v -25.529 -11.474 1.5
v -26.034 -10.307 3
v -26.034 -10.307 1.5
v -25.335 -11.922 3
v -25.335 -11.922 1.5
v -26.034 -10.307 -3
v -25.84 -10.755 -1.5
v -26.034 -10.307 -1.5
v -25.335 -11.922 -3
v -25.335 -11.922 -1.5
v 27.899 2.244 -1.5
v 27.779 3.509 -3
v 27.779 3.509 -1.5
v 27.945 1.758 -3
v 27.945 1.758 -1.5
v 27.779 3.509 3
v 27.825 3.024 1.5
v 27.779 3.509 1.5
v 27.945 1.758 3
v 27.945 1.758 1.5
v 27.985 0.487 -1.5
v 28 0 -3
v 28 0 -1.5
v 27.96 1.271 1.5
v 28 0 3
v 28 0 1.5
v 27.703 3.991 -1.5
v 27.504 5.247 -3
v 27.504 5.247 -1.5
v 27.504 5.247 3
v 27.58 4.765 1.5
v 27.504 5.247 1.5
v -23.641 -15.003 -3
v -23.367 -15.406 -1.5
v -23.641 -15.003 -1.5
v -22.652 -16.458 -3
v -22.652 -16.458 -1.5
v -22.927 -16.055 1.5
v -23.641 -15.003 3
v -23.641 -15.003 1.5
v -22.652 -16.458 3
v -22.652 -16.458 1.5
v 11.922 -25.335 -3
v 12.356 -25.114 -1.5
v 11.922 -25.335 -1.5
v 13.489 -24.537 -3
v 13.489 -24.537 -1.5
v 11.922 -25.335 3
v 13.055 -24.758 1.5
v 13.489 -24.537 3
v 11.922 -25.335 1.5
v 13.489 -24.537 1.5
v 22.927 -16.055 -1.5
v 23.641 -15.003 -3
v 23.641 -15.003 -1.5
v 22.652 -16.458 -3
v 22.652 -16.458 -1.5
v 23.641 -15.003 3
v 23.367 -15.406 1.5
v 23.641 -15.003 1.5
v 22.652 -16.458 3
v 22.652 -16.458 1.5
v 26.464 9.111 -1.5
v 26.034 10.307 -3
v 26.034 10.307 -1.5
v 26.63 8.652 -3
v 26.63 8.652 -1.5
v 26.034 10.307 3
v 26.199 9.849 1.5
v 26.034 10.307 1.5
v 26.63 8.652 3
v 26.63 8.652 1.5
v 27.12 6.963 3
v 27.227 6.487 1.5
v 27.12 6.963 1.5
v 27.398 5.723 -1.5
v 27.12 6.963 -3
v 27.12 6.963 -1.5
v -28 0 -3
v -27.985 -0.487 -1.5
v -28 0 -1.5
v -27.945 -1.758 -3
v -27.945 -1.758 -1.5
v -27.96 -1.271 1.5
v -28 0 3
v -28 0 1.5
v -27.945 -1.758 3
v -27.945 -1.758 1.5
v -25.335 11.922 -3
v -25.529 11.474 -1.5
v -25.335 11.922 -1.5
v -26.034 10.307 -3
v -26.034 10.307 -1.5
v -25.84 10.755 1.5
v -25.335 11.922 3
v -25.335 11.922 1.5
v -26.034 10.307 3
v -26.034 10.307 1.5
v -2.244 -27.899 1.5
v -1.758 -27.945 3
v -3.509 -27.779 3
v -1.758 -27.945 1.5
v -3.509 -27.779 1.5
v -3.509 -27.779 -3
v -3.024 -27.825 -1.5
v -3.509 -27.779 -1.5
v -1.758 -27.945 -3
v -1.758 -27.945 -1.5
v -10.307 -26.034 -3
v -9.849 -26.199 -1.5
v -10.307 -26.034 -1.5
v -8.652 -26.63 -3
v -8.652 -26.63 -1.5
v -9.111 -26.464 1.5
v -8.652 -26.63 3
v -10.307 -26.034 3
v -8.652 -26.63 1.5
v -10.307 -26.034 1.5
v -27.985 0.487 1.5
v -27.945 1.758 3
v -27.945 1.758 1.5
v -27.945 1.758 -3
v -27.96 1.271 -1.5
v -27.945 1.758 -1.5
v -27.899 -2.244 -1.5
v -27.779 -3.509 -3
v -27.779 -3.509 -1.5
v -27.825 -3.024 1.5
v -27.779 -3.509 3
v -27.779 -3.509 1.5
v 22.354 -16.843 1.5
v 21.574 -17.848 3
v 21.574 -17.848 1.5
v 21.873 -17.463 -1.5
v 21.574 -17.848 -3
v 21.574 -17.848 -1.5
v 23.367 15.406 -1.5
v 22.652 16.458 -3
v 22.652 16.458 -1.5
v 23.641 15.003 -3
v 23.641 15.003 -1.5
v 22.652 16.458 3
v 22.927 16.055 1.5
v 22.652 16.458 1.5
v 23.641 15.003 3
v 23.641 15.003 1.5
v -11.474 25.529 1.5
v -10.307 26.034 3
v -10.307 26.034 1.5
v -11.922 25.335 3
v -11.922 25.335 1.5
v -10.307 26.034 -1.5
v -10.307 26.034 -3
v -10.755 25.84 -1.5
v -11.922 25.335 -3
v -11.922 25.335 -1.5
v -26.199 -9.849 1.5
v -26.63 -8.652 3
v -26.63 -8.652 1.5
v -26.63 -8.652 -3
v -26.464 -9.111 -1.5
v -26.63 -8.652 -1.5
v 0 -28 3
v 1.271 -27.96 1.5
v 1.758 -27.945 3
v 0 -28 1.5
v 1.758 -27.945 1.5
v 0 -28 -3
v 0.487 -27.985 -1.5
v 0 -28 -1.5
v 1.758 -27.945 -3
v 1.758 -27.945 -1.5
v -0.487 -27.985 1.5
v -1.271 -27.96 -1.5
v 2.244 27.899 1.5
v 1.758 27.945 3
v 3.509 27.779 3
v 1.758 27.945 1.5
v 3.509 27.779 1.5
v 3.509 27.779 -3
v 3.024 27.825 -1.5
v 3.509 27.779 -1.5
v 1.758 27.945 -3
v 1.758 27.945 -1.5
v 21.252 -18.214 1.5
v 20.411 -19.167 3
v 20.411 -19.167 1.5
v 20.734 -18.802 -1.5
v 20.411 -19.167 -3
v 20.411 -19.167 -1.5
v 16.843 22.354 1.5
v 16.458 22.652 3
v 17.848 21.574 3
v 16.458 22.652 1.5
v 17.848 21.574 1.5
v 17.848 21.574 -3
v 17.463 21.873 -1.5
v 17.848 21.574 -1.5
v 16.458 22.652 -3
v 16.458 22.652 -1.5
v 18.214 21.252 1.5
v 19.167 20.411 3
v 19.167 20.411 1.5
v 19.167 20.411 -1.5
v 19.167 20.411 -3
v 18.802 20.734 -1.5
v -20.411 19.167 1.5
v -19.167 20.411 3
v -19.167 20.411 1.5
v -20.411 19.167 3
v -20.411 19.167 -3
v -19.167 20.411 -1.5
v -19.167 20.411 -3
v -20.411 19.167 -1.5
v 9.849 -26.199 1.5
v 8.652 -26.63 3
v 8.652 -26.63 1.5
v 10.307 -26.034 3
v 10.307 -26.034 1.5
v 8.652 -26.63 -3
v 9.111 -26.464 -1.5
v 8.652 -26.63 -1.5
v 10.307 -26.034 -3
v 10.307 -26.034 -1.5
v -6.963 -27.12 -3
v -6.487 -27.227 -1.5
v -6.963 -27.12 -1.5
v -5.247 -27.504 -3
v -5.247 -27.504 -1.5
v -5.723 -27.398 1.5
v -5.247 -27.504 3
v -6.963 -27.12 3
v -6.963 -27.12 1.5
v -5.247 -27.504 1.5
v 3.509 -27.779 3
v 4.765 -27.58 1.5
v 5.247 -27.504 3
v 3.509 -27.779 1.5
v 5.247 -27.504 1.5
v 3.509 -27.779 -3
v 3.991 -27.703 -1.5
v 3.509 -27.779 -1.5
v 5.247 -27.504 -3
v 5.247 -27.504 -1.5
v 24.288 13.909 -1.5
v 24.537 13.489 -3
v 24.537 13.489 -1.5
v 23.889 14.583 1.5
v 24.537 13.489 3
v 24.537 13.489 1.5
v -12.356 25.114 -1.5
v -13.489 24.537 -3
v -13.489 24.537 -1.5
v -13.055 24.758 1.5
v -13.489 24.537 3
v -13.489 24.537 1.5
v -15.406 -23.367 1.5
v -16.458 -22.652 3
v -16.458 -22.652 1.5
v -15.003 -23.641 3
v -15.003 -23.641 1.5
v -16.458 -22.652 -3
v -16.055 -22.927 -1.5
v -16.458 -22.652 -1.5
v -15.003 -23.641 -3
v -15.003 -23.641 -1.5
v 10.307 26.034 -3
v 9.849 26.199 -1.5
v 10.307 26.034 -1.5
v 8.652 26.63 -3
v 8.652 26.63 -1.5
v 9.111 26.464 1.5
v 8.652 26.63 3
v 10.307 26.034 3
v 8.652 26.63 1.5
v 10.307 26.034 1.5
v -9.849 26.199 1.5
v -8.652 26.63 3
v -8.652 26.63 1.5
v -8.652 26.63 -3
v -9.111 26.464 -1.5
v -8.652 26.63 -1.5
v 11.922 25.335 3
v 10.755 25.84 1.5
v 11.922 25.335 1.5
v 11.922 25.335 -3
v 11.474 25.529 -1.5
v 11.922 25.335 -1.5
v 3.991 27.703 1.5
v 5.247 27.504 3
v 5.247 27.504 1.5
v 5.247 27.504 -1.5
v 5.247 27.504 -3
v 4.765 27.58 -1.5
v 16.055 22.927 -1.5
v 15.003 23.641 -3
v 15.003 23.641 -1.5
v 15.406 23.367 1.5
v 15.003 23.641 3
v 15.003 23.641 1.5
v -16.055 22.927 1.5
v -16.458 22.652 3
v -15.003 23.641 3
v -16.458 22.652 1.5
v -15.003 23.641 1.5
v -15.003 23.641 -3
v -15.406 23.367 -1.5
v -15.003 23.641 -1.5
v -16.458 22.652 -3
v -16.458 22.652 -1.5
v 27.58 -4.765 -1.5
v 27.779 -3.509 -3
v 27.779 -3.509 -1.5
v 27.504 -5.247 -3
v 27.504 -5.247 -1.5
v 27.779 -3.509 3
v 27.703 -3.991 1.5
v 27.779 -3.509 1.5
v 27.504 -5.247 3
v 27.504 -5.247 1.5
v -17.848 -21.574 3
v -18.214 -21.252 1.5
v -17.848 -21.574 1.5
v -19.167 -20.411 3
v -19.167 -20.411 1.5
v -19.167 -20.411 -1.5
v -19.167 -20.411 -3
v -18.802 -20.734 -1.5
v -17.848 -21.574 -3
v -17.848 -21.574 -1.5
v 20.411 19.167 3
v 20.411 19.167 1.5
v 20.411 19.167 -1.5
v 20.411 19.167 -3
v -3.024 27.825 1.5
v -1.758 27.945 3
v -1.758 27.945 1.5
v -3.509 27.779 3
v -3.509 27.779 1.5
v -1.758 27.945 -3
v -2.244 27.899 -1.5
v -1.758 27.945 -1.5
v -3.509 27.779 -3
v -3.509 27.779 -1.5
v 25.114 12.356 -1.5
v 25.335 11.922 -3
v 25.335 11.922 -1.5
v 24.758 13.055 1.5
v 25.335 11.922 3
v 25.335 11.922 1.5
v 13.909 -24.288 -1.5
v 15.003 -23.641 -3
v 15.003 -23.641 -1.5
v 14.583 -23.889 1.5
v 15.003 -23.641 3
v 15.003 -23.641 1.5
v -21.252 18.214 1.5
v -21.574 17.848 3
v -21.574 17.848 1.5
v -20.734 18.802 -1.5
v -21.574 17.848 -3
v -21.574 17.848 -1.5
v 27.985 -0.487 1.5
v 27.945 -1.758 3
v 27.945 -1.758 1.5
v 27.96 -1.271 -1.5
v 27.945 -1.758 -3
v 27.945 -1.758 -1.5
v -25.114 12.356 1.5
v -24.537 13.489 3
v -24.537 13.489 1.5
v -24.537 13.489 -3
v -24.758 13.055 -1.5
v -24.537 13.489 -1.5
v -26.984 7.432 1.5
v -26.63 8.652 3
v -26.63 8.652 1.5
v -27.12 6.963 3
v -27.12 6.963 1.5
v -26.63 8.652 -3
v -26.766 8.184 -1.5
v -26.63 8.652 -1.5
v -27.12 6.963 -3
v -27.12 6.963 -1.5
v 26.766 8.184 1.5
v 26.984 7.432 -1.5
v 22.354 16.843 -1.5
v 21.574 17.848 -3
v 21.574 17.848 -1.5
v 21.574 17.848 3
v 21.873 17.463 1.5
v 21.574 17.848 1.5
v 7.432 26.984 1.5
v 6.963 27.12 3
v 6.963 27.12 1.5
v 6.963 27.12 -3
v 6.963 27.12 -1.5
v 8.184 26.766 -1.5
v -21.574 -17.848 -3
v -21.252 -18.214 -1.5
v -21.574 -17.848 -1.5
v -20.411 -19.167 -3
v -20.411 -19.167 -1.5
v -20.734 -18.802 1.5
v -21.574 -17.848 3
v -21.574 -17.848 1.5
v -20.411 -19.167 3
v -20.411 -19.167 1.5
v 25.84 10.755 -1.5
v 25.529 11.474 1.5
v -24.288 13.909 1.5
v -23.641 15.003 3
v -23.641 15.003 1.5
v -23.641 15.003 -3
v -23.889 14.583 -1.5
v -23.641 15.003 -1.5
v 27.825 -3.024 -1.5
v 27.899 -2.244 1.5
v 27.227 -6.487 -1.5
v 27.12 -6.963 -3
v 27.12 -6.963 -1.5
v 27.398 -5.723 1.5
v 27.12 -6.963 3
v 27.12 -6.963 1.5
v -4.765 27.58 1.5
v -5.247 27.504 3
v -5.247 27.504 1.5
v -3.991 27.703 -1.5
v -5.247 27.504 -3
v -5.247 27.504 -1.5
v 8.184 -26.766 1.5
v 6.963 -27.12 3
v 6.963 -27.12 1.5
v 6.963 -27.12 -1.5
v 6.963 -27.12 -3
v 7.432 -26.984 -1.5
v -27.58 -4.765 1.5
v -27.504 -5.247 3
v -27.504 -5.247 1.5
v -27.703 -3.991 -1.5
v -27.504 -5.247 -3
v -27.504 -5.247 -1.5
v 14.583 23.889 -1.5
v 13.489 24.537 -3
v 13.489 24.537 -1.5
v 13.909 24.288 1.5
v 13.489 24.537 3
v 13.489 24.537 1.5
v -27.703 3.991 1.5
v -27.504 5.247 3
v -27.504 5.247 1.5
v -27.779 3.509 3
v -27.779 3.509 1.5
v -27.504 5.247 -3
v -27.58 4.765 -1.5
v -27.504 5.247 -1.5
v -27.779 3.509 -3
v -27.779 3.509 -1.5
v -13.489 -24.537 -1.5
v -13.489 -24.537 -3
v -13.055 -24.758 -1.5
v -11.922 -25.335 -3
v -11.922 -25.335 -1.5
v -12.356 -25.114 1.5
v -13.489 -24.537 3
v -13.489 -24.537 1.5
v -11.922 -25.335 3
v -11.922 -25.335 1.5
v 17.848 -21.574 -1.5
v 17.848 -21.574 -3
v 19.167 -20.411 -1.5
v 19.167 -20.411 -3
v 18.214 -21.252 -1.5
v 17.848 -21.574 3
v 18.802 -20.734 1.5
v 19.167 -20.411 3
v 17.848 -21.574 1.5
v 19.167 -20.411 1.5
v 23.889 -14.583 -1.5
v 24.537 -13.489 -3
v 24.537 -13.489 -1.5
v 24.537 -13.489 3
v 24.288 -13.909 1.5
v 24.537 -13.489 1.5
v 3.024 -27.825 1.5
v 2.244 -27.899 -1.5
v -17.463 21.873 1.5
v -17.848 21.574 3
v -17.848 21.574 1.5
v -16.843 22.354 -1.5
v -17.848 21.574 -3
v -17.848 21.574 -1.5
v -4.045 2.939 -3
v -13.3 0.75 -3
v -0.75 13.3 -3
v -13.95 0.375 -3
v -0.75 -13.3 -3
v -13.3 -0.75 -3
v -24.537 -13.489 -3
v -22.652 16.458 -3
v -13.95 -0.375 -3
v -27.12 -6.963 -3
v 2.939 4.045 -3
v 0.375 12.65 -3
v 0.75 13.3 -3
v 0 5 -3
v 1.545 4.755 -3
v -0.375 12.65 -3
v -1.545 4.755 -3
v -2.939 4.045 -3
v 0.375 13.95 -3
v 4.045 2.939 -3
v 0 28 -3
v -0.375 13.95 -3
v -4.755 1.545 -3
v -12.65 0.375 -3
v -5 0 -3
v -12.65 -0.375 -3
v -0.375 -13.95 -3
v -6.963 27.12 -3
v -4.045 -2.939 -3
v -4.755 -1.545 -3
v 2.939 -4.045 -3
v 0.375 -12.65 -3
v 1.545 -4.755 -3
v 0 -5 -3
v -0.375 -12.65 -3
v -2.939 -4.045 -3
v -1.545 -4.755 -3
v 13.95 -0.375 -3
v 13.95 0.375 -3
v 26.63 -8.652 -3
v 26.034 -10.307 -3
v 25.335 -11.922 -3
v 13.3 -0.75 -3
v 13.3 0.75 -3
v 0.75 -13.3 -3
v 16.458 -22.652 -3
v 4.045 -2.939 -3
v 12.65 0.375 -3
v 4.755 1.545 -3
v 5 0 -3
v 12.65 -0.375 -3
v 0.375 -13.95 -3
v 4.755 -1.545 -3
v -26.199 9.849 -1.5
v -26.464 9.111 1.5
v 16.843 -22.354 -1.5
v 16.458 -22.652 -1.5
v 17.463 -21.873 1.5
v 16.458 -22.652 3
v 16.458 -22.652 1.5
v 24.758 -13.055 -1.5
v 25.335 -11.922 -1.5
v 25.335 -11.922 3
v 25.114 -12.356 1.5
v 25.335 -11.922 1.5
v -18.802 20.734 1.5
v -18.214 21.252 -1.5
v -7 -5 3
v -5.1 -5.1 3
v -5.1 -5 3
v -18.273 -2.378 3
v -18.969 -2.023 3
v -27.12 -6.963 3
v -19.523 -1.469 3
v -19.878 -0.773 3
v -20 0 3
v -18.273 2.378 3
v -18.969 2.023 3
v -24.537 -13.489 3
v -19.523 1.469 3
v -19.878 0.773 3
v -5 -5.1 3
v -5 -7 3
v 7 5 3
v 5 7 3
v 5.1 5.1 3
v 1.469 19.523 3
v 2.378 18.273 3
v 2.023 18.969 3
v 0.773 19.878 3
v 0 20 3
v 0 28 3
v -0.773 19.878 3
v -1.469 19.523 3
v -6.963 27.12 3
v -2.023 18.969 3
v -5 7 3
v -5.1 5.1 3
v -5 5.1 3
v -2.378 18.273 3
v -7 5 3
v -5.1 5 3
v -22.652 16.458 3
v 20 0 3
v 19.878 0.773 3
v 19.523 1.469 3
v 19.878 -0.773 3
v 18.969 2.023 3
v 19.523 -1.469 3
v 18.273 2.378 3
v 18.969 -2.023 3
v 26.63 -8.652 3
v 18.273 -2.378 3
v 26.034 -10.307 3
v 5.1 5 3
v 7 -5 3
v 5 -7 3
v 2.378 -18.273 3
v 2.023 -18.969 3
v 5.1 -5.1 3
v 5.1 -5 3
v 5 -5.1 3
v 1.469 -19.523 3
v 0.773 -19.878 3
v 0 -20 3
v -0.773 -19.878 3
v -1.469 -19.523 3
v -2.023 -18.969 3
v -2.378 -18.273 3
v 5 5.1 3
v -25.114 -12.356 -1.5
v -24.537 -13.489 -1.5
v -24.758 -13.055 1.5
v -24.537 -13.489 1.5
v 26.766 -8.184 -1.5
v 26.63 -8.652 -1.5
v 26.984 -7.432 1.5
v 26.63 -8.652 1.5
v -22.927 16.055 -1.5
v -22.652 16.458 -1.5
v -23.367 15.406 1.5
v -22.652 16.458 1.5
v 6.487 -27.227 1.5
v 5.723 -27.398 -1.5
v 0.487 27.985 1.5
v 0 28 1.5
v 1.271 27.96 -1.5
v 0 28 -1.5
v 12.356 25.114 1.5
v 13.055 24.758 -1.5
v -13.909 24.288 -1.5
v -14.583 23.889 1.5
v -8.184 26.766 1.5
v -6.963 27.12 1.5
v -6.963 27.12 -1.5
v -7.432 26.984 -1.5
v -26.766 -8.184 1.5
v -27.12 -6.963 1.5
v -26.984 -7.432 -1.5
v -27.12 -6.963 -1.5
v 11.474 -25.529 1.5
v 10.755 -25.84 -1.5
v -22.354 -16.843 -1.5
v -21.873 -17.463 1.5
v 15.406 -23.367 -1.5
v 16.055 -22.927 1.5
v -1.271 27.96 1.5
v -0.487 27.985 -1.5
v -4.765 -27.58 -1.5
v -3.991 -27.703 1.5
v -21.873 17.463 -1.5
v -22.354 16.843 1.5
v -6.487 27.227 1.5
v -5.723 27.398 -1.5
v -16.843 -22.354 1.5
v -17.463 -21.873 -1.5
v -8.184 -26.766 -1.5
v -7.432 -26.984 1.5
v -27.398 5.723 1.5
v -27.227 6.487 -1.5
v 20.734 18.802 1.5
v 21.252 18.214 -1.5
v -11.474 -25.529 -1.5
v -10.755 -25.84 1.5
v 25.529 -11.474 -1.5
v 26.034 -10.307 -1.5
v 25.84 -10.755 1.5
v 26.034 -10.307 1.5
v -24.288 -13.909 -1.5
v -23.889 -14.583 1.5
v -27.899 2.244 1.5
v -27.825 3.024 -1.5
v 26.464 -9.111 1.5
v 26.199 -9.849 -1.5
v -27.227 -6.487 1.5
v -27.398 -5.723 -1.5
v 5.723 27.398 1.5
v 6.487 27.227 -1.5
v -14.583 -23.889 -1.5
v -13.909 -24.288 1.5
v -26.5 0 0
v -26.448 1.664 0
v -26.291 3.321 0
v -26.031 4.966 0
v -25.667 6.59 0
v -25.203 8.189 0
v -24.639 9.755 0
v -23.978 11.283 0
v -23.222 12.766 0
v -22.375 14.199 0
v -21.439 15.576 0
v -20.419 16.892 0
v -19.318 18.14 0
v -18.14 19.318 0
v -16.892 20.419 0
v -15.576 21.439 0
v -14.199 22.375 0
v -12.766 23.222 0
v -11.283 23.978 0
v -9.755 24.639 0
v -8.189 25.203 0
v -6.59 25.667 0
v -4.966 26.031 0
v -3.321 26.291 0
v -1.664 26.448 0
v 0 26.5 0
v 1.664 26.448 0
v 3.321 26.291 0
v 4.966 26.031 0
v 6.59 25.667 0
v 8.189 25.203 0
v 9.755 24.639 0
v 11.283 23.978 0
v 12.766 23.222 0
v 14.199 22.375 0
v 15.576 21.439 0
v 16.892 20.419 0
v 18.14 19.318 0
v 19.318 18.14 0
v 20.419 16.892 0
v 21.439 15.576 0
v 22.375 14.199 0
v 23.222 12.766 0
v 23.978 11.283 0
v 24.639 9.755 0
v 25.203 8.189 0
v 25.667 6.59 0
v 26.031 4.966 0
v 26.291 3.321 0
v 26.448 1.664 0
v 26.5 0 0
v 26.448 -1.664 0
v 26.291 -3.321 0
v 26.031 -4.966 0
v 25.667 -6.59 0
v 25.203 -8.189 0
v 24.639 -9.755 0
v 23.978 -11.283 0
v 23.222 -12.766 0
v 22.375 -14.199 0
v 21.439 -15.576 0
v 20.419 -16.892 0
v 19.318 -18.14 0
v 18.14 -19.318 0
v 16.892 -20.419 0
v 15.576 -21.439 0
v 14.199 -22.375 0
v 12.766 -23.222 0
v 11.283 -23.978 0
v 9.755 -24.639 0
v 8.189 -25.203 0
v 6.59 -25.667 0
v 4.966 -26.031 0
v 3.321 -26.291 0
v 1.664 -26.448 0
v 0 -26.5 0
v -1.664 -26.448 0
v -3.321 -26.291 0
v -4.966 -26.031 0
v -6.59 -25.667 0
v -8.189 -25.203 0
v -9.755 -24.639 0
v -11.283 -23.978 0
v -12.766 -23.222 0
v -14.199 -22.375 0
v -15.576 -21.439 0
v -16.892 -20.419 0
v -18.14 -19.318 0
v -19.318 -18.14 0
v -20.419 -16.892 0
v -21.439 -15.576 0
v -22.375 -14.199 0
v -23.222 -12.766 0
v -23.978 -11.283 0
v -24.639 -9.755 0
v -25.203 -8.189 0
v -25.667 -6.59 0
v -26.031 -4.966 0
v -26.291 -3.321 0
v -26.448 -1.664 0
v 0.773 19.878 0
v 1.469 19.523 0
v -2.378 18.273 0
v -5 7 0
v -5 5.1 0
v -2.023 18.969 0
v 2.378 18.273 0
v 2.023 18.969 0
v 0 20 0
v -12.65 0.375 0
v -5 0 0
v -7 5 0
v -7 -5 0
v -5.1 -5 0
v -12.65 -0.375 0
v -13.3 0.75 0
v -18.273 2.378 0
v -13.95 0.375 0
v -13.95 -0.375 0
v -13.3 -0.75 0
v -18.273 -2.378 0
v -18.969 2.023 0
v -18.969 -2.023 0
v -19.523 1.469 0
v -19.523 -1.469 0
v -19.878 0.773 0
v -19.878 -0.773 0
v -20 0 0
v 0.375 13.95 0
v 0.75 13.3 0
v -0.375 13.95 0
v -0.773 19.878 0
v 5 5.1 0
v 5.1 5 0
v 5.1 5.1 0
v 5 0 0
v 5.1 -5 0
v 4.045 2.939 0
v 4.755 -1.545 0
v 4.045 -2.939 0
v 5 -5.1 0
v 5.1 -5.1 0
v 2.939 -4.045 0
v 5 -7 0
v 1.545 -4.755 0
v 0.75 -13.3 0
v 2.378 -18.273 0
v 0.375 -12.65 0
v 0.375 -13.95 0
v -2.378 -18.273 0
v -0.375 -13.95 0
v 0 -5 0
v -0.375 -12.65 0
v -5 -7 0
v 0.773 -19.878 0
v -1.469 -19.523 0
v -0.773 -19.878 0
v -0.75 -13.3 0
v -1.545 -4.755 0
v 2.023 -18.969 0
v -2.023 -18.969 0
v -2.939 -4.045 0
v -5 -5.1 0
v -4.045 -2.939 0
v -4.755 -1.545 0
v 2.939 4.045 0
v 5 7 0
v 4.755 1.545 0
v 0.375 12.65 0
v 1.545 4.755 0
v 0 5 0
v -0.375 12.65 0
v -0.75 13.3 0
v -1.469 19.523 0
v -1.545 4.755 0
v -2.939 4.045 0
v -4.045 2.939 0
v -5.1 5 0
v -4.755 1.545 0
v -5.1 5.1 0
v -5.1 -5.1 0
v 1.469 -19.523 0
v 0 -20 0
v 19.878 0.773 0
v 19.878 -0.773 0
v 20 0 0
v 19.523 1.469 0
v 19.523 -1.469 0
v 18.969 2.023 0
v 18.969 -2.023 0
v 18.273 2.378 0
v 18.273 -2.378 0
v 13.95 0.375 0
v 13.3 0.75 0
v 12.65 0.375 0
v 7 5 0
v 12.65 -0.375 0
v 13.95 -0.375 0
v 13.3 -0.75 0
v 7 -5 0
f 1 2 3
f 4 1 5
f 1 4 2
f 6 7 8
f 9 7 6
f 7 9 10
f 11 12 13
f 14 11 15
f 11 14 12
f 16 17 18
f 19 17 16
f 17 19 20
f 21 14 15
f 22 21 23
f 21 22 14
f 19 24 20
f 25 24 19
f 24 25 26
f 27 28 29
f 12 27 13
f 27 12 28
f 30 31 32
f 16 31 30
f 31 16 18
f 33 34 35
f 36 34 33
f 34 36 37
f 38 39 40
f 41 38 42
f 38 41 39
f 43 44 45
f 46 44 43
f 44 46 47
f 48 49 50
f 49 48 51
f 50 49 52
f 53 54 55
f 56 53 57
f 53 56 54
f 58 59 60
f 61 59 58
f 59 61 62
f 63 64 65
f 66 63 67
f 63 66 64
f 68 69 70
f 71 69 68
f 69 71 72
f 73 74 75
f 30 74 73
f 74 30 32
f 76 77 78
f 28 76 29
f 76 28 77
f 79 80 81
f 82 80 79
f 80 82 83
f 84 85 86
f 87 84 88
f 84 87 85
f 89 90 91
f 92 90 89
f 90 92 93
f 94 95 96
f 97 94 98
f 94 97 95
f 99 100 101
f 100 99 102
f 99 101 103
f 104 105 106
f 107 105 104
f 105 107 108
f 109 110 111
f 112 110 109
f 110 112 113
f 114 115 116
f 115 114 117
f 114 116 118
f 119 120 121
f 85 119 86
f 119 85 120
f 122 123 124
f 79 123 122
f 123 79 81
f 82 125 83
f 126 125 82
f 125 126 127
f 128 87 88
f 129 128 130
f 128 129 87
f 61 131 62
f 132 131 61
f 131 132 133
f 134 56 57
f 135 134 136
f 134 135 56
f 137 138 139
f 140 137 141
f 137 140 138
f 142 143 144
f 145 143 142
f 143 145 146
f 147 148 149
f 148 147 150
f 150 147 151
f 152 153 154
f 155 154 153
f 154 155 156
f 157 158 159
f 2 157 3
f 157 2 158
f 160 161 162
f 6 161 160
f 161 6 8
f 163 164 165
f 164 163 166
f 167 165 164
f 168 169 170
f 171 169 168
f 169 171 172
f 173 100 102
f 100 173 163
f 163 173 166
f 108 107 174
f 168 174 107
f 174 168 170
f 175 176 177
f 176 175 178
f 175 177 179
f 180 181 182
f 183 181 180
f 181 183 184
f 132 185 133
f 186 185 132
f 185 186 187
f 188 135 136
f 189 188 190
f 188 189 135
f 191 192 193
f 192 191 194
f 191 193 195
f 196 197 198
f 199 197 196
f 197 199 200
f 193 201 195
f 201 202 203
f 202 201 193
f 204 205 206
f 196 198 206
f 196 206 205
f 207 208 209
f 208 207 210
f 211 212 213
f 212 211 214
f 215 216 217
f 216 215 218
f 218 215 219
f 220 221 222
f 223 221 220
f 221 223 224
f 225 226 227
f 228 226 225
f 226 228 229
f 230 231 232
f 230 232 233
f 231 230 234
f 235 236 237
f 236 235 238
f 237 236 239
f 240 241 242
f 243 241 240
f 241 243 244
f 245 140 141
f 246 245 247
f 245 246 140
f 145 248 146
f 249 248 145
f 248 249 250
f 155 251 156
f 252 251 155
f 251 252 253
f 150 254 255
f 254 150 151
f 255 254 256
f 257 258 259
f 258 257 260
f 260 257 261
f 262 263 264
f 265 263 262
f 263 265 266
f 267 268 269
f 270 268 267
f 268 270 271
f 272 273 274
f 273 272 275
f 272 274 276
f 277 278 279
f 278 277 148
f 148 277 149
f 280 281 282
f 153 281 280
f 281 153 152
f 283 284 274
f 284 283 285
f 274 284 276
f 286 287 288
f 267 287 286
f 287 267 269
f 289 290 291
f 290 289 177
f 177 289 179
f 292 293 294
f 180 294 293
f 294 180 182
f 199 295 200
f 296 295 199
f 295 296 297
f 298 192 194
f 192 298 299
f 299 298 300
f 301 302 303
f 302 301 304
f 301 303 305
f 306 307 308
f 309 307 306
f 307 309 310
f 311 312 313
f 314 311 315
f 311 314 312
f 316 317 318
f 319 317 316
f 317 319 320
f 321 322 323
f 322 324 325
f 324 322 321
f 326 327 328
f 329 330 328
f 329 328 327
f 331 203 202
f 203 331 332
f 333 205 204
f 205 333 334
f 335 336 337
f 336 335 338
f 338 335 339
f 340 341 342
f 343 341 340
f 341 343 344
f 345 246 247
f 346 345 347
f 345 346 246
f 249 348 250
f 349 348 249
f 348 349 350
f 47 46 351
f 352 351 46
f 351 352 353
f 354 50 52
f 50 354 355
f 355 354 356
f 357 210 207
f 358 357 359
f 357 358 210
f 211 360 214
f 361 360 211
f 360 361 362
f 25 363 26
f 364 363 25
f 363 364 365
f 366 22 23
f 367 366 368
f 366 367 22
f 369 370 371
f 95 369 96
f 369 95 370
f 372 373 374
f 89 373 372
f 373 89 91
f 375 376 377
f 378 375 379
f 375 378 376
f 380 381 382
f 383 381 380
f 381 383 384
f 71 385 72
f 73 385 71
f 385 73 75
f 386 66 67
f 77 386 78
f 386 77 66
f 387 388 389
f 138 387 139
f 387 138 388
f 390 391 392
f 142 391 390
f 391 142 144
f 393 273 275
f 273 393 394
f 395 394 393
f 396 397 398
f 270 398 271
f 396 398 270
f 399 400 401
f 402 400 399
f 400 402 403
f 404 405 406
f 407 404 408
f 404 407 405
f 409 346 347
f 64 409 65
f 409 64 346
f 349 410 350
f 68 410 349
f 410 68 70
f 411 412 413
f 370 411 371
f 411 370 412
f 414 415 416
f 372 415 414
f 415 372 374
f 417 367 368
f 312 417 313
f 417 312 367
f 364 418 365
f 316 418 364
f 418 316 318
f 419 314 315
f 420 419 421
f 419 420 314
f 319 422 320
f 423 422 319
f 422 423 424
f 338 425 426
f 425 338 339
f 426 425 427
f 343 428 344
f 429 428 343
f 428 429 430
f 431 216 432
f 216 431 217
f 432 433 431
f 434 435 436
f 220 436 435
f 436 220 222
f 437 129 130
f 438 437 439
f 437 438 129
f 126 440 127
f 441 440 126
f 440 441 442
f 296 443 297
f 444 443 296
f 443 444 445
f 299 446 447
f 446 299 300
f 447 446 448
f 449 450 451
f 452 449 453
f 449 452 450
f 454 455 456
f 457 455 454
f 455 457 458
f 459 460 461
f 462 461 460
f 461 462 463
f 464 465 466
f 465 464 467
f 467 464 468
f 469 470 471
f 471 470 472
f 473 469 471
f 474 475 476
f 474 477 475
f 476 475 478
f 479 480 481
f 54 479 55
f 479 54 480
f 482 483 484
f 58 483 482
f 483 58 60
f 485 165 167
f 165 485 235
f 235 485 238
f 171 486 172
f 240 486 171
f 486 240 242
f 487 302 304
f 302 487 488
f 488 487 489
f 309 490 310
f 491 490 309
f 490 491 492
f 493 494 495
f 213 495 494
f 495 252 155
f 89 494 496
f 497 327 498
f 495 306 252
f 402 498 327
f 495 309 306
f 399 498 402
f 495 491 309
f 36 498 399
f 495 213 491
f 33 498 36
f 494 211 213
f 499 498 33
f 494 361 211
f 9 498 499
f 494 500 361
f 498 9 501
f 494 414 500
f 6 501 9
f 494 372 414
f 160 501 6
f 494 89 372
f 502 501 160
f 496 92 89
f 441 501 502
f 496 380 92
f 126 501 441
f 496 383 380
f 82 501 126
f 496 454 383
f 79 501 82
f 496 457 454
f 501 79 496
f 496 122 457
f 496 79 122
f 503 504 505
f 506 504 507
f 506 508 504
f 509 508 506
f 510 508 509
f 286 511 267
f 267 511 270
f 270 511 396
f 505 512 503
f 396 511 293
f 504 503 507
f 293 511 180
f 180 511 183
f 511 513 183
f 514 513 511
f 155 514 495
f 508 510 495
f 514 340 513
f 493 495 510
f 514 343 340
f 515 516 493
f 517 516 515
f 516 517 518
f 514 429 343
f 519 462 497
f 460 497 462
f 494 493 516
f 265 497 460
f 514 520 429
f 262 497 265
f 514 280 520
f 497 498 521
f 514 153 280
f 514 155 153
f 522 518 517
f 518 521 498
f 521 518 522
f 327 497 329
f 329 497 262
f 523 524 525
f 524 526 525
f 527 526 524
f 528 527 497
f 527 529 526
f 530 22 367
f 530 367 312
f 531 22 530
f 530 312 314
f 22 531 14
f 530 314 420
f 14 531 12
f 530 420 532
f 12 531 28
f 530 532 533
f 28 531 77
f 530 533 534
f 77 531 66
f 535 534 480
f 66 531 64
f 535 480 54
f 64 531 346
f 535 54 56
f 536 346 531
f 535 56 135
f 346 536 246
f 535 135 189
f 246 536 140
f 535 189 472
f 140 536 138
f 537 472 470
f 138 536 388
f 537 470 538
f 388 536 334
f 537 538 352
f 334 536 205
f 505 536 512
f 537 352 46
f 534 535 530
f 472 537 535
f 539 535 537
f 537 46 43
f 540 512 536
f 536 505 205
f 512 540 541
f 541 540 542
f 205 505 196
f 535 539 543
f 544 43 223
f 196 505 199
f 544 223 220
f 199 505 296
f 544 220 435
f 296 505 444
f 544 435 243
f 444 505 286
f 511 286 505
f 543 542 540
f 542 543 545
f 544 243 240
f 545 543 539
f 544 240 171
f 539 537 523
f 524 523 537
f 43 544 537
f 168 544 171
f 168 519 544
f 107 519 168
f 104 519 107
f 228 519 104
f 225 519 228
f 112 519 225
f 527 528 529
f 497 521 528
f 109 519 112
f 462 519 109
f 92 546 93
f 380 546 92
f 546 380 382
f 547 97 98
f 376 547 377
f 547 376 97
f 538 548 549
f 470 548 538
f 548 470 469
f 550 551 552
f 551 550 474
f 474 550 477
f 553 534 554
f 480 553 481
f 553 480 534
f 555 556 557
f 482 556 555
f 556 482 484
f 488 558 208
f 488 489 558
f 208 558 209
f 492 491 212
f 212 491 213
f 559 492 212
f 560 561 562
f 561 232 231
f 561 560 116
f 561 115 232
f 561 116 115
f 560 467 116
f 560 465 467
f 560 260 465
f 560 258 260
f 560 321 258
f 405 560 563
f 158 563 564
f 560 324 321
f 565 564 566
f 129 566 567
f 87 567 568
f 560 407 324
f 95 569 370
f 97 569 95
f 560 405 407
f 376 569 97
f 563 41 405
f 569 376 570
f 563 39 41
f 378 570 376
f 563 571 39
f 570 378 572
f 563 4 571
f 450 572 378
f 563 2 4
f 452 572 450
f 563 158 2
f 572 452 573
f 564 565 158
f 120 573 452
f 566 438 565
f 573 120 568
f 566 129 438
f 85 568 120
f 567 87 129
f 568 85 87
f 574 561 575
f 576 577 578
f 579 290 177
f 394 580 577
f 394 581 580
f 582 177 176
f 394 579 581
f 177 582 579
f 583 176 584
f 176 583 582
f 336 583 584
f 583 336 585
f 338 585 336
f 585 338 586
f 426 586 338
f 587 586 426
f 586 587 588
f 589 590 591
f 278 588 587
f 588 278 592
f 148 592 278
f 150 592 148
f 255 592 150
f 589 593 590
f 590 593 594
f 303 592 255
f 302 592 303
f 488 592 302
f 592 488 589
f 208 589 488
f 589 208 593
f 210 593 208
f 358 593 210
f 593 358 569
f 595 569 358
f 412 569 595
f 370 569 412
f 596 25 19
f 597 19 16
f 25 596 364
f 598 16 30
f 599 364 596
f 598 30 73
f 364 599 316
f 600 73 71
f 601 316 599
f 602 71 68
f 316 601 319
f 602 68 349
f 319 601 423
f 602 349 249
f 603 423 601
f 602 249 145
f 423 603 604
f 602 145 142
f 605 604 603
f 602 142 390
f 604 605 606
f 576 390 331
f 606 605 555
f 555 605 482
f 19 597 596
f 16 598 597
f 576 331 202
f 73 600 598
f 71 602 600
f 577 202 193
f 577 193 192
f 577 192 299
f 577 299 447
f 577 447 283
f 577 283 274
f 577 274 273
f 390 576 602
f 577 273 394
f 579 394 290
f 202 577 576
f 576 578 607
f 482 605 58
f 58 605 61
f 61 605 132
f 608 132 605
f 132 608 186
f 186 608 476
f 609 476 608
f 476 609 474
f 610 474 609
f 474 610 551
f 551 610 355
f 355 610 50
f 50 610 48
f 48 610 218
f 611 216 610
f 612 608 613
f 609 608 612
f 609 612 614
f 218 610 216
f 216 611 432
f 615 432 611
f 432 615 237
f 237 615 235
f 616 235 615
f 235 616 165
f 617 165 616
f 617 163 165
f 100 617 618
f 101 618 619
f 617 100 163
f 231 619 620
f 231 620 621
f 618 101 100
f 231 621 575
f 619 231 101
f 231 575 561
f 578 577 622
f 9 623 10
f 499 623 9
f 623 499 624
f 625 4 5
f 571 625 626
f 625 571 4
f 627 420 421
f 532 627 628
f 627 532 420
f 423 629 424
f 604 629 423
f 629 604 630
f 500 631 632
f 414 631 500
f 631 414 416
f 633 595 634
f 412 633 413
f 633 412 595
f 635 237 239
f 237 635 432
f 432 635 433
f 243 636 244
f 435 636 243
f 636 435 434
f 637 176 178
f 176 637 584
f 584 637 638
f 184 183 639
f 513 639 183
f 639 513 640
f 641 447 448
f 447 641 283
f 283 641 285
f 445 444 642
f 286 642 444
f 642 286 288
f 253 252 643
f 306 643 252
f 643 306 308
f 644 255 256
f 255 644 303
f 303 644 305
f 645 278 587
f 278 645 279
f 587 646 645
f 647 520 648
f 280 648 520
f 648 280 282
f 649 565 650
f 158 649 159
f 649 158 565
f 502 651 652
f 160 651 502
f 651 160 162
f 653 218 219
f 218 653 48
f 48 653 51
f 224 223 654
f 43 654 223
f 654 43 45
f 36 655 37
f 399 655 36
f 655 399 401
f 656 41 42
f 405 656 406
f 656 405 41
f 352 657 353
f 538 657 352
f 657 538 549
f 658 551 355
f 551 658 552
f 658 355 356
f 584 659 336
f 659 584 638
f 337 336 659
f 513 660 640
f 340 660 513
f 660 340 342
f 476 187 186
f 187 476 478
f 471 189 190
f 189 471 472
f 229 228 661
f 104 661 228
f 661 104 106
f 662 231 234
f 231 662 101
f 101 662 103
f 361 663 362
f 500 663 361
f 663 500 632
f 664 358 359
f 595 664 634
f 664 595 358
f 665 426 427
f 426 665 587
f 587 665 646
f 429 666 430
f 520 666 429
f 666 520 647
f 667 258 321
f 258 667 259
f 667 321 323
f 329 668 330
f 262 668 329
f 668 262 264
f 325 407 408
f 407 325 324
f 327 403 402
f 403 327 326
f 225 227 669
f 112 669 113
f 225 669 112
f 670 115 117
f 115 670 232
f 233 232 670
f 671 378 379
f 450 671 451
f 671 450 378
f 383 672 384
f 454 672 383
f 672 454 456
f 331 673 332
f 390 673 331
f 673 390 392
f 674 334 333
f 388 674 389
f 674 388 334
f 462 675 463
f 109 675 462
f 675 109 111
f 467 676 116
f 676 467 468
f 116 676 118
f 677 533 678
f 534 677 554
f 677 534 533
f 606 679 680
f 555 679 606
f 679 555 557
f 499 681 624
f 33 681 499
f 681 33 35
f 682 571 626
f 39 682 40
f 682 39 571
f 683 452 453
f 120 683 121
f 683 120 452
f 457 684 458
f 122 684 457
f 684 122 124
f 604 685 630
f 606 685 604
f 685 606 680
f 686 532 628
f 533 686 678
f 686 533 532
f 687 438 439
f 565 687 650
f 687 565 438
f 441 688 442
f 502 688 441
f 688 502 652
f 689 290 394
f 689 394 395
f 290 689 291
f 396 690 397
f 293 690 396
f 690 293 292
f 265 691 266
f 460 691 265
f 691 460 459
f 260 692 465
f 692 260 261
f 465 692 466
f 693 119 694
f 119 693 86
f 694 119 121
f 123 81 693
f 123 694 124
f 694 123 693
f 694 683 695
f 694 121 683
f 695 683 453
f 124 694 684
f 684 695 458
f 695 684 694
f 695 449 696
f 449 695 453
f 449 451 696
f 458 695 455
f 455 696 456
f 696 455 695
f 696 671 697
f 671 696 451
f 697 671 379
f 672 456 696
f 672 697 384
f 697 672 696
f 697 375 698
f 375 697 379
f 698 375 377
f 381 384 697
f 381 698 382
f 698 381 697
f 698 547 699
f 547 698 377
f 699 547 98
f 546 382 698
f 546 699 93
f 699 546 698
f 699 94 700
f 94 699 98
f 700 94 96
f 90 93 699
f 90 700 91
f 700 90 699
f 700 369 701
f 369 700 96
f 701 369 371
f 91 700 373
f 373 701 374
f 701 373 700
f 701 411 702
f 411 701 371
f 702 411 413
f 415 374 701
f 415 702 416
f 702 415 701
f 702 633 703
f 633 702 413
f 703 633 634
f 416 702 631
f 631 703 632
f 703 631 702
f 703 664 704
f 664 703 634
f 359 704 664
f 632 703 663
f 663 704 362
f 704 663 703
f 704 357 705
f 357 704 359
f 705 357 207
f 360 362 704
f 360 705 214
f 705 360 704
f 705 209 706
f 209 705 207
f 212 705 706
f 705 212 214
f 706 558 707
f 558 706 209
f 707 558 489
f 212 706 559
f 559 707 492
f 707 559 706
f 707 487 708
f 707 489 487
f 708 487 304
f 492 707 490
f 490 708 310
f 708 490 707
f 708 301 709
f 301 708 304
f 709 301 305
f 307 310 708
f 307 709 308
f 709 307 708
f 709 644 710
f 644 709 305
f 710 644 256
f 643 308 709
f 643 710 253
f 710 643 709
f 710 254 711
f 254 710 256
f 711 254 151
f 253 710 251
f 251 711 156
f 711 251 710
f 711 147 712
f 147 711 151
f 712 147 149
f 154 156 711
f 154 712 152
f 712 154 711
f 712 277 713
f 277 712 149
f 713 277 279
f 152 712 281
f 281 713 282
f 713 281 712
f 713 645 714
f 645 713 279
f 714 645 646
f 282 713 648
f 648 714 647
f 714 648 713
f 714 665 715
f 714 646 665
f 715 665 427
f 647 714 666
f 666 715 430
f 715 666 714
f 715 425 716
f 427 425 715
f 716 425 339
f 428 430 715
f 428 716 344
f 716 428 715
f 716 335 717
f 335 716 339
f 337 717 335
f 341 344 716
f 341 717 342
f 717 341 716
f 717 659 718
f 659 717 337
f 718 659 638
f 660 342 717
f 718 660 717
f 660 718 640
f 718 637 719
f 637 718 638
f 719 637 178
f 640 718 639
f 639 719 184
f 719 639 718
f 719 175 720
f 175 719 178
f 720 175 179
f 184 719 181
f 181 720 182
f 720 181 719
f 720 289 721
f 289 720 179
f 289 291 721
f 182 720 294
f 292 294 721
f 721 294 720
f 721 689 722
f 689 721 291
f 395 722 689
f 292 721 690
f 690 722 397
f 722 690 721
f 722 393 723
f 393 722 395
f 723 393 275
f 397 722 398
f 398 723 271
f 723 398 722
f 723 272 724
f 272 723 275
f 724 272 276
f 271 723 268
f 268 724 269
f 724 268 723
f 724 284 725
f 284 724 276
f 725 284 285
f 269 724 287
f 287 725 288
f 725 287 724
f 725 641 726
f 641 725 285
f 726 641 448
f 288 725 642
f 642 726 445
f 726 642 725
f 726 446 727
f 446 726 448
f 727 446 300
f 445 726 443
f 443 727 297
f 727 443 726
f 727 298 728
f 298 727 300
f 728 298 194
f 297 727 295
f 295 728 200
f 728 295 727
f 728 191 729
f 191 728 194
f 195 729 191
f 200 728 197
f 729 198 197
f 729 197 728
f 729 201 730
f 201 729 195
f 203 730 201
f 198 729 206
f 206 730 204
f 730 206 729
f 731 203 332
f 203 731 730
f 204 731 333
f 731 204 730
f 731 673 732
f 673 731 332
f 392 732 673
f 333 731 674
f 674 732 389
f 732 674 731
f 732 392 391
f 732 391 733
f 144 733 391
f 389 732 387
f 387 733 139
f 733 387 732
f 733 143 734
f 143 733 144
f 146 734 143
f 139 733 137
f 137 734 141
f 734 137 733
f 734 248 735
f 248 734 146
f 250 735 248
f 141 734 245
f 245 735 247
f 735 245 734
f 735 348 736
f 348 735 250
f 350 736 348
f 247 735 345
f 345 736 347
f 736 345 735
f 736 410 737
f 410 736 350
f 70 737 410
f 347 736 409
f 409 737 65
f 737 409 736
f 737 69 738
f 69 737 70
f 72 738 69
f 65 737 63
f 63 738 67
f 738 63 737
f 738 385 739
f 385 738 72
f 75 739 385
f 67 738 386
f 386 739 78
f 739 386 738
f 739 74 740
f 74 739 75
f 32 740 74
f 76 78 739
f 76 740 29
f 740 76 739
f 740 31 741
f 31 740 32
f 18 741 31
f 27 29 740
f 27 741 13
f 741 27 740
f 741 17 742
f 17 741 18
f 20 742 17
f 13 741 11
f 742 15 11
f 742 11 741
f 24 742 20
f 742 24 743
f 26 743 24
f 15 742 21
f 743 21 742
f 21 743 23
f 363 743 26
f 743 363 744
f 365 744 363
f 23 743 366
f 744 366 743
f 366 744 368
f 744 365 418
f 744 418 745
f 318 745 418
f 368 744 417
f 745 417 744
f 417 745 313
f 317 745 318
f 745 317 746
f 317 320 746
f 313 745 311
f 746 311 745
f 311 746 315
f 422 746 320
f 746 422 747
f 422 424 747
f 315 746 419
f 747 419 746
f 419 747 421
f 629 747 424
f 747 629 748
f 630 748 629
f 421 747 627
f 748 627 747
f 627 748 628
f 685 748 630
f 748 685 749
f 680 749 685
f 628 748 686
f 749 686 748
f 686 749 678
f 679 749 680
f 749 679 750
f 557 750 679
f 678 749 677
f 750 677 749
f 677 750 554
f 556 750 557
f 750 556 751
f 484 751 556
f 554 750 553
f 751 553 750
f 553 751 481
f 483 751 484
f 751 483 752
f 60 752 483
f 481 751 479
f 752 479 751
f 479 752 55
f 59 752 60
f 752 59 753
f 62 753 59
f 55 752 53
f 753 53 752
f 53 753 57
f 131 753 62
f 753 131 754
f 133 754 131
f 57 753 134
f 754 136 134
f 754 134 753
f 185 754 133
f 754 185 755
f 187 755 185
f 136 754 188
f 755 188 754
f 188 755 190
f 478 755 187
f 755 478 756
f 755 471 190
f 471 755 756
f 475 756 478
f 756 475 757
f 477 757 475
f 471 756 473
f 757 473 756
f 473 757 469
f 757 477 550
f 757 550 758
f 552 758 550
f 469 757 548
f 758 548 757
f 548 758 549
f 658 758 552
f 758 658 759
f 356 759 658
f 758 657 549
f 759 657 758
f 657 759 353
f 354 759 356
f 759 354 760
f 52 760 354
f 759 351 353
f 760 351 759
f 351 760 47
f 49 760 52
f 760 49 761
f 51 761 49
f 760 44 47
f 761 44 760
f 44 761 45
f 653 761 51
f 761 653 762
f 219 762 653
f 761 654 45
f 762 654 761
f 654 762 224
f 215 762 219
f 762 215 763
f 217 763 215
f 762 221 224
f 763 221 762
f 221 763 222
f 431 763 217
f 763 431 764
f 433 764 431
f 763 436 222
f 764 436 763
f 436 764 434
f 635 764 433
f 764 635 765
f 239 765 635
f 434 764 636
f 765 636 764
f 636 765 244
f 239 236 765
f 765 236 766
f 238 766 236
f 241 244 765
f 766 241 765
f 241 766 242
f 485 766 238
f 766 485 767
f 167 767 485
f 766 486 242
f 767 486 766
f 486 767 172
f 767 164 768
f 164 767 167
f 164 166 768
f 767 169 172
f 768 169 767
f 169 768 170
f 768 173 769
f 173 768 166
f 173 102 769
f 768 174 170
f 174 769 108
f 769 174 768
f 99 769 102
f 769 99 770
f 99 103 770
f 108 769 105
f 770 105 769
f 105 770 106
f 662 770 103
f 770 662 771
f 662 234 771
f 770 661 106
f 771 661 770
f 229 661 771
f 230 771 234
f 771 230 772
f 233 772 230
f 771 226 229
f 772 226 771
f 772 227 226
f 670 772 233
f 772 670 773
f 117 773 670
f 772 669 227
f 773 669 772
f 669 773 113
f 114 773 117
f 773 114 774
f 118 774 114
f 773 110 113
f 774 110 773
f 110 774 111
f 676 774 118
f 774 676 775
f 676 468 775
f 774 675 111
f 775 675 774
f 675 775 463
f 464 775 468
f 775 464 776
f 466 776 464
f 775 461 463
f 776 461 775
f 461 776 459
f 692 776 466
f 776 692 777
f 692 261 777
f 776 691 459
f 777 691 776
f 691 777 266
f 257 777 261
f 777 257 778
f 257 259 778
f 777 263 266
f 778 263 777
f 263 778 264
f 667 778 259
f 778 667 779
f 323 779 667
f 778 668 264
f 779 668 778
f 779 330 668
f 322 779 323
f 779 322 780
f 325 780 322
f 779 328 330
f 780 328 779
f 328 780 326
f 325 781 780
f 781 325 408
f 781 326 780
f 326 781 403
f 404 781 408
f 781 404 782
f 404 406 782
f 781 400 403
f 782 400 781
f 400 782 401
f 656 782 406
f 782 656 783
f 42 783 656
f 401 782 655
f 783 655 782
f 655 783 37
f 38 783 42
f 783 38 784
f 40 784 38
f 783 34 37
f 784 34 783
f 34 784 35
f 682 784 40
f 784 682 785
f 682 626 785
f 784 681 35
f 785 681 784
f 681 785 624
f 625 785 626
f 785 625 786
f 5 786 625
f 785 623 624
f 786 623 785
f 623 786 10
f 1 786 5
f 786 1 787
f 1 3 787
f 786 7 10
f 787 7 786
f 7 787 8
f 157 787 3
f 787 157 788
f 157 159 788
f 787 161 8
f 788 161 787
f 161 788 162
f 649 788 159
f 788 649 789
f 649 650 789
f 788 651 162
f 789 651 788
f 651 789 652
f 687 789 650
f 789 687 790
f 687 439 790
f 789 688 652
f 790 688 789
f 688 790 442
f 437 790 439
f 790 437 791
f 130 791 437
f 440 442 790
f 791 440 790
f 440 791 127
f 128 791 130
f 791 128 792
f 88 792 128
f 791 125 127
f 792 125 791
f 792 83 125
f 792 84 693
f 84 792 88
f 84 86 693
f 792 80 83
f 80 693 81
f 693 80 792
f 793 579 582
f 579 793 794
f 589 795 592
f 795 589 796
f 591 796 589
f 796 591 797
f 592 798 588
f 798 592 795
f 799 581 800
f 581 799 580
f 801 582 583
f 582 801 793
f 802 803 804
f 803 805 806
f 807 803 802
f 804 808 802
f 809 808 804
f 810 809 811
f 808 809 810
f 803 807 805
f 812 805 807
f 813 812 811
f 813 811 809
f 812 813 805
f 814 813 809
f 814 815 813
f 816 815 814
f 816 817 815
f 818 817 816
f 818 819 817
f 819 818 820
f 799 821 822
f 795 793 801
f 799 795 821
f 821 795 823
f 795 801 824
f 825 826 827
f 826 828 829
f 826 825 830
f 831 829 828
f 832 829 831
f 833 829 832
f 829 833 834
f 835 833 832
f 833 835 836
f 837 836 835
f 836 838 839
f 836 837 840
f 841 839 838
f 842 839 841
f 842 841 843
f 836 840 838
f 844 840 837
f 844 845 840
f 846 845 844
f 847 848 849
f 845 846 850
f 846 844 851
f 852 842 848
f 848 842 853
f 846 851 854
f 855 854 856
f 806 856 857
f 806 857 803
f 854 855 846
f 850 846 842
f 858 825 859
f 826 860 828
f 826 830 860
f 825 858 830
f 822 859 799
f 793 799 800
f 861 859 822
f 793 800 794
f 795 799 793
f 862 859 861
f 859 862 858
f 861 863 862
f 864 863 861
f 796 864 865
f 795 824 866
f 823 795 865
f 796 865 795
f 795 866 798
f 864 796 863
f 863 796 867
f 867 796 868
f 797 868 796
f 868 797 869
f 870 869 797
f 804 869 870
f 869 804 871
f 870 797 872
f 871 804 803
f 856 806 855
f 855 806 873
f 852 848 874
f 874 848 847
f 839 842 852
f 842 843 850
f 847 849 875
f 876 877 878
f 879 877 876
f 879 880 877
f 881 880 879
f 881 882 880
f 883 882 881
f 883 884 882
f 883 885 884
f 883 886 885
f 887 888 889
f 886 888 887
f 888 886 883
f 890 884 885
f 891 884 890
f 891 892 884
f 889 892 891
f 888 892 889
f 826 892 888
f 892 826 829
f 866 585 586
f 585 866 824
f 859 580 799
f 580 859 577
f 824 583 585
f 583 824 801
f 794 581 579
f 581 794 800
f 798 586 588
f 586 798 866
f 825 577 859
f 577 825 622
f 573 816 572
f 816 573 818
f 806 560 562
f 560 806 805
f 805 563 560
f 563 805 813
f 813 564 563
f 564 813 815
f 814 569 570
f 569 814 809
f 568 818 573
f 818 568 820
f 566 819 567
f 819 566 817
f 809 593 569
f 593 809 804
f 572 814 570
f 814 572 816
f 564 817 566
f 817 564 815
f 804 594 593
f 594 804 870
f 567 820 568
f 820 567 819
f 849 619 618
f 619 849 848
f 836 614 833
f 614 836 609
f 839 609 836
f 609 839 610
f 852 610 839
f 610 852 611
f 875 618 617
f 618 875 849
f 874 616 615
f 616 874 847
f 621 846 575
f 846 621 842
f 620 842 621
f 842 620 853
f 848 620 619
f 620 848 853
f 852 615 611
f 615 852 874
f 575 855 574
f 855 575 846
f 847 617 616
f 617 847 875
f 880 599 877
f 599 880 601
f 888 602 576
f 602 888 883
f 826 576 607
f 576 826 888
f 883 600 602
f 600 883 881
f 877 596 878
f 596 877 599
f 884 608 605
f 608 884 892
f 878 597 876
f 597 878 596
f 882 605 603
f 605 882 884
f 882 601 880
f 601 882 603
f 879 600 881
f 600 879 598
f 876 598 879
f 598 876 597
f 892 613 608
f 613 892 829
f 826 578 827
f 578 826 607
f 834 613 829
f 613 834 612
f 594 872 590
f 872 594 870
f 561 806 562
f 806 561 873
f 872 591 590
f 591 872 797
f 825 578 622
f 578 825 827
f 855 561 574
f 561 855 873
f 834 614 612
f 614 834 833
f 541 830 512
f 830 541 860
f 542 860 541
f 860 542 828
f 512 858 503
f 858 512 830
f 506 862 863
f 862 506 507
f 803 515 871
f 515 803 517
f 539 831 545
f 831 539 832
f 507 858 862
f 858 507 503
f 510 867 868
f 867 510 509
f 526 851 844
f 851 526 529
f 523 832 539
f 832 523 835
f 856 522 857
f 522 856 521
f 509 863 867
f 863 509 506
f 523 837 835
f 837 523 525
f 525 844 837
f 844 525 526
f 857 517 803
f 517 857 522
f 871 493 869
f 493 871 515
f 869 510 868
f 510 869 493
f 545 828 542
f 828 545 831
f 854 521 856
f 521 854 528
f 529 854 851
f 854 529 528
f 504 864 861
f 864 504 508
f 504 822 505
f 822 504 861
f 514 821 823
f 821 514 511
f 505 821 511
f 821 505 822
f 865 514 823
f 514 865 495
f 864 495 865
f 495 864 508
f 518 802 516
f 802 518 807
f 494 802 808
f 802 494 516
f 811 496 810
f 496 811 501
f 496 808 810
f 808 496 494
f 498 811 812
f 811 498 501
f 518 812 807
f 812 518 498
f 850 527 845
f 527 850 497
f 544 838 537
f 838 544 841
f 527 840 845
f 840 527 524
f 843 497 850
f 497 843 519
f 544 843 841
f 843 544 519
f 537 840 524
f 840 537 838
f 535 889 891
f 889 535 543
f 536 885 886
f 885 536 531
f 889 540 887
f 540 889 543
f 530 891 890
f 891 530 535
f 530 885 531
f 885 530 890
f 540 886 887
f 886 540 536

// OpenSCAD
//-- Futaba 3003 servo rounded horn parameters

rh_diam1 = 8;  //-- Rounded horn small diameter
rh_diam2 = 21; //-- Rounded horn big diameter
rh_height = 6; //-- Rounded horn  total height (including the plate height)
rh_plate_height = 2;  //-- Rounded horn big plate height

//-- Cross horn parameters
end_diam = 5;
center_diam = 10;
length = 15;


//-------------------------------------------------------
//--- Parameters:
//-- or_idiam: O-ring inner diameter
//-- or_diam: O-ring section diameter
//-- h: Height of the wheel
//--
//--  Module for generating a raw wheel, without any drill
//-------------------------------------------------------
module raw_wheel(or_idiam=50, or_diam=3, h=6)
{
   //-- Wheel parameters
   r = or_idiam/2 + or_diam;   //-- Radius

  //-- Temporal points
  l = or_diam*sqrt(2)/2;

  difference() {
    //-- Body of the wheel
    cylinder (r=r, h=h, $fn=100,center=true);

    //--  wheel's inner section
    rotate_extrude($fn=100)
      translate([r-or_diam/2,0,0])
      polygon( [ [0,0],[l,l],[l,-l] ] , [ [0,1,2] ]);
  }
}


//-------------------------------------------------------
//--- Parameters:
//-- or_idiam: O-ring inner diameter
//-- or_diam: O-ring section diameter
//-- h: Height of the wheel
//--
//-- This module creates a raw-wheel with the connections for
//-- a futaba 3003 servo. 
//-------------------------------------------------------
module Servo_wheel(or_idiam=50, or_diam=3, h=6)
{
  difference() {
      raw_wheel(or_idiam=or_idiam, or_diam=or_diam, h=h);

       //-- Inner drill
      cylinder(center=true, h=2*h + 10, r=rh_diam1/2+0.2,$fn=100);

      //-- Carved circle for the Futaba rounded horn
      translate([0,0,-h/2+rh_height-rh_plate_height]) cylinder(r=rh_diam2/2+0.25, h=2*h+10,$fn=100);
  }

}

module cross_horn_arm(h=5)
{
  translate([0,length-end_diam/2,0])
  hull() {
    cylinder(r=end_diam/2, h=h, center=true, $fn=20);
    translate([0,1-length+end_diam/2,0])
    cube([center_diam,2,h],center=true);
  }
}

module cross_horn_drills(h=5)
{ 
  union() {
    for ( i = [0 : 3] ) {
        rotate([0,0,i*90])
        translate([0,13.3,0])
        cylinder(r=1.5/2, h=h+10,center=true, $fn=6);  
      }
  }
}


module cross_horn(h=5)
{
  union() {
    cube([center_diam+0.2,center_diam+0.2,h],center=true);

    for ( i = [0 : 3] ) {
      rotate( [0,0,i*90])
      translate([0, center_diam/2, 0])
      cross_horn_arm(h);
    }
  }

}

module servo_wheel_cross(or_idiam=50, or_diam=3, h=6)
{
  difference() {
      raw_wheel(or_idiam=or_idiam, or_diam=or_diam, h=h);

       //-- Inner drill
      cylinder(center=true, h=2*h + 10, r=center_diam/2,$fn=20);

      //-- substract the cross servo horn
      translate([0,0,-h/2+4/2+rh_height-3])
      cross_horn(h=4);

      //-- wheel decoration
      *for (i=[0:3]) {
        rotate([0,0,i*90])
        translate([or_idiam/4,or_idiam/4,0])
        rotate([0,0,45+180])
        cylinder(r=6, h=h+10, center=true, $fn=3);
      }
  }
}


difference() {
  servo_wheel_cross();
  cross_horn_drills();
}

*difference() {
  cross_horn(h=4);
  cross_horn_drills();
}

//-- Test!
//Servo_wheel();
